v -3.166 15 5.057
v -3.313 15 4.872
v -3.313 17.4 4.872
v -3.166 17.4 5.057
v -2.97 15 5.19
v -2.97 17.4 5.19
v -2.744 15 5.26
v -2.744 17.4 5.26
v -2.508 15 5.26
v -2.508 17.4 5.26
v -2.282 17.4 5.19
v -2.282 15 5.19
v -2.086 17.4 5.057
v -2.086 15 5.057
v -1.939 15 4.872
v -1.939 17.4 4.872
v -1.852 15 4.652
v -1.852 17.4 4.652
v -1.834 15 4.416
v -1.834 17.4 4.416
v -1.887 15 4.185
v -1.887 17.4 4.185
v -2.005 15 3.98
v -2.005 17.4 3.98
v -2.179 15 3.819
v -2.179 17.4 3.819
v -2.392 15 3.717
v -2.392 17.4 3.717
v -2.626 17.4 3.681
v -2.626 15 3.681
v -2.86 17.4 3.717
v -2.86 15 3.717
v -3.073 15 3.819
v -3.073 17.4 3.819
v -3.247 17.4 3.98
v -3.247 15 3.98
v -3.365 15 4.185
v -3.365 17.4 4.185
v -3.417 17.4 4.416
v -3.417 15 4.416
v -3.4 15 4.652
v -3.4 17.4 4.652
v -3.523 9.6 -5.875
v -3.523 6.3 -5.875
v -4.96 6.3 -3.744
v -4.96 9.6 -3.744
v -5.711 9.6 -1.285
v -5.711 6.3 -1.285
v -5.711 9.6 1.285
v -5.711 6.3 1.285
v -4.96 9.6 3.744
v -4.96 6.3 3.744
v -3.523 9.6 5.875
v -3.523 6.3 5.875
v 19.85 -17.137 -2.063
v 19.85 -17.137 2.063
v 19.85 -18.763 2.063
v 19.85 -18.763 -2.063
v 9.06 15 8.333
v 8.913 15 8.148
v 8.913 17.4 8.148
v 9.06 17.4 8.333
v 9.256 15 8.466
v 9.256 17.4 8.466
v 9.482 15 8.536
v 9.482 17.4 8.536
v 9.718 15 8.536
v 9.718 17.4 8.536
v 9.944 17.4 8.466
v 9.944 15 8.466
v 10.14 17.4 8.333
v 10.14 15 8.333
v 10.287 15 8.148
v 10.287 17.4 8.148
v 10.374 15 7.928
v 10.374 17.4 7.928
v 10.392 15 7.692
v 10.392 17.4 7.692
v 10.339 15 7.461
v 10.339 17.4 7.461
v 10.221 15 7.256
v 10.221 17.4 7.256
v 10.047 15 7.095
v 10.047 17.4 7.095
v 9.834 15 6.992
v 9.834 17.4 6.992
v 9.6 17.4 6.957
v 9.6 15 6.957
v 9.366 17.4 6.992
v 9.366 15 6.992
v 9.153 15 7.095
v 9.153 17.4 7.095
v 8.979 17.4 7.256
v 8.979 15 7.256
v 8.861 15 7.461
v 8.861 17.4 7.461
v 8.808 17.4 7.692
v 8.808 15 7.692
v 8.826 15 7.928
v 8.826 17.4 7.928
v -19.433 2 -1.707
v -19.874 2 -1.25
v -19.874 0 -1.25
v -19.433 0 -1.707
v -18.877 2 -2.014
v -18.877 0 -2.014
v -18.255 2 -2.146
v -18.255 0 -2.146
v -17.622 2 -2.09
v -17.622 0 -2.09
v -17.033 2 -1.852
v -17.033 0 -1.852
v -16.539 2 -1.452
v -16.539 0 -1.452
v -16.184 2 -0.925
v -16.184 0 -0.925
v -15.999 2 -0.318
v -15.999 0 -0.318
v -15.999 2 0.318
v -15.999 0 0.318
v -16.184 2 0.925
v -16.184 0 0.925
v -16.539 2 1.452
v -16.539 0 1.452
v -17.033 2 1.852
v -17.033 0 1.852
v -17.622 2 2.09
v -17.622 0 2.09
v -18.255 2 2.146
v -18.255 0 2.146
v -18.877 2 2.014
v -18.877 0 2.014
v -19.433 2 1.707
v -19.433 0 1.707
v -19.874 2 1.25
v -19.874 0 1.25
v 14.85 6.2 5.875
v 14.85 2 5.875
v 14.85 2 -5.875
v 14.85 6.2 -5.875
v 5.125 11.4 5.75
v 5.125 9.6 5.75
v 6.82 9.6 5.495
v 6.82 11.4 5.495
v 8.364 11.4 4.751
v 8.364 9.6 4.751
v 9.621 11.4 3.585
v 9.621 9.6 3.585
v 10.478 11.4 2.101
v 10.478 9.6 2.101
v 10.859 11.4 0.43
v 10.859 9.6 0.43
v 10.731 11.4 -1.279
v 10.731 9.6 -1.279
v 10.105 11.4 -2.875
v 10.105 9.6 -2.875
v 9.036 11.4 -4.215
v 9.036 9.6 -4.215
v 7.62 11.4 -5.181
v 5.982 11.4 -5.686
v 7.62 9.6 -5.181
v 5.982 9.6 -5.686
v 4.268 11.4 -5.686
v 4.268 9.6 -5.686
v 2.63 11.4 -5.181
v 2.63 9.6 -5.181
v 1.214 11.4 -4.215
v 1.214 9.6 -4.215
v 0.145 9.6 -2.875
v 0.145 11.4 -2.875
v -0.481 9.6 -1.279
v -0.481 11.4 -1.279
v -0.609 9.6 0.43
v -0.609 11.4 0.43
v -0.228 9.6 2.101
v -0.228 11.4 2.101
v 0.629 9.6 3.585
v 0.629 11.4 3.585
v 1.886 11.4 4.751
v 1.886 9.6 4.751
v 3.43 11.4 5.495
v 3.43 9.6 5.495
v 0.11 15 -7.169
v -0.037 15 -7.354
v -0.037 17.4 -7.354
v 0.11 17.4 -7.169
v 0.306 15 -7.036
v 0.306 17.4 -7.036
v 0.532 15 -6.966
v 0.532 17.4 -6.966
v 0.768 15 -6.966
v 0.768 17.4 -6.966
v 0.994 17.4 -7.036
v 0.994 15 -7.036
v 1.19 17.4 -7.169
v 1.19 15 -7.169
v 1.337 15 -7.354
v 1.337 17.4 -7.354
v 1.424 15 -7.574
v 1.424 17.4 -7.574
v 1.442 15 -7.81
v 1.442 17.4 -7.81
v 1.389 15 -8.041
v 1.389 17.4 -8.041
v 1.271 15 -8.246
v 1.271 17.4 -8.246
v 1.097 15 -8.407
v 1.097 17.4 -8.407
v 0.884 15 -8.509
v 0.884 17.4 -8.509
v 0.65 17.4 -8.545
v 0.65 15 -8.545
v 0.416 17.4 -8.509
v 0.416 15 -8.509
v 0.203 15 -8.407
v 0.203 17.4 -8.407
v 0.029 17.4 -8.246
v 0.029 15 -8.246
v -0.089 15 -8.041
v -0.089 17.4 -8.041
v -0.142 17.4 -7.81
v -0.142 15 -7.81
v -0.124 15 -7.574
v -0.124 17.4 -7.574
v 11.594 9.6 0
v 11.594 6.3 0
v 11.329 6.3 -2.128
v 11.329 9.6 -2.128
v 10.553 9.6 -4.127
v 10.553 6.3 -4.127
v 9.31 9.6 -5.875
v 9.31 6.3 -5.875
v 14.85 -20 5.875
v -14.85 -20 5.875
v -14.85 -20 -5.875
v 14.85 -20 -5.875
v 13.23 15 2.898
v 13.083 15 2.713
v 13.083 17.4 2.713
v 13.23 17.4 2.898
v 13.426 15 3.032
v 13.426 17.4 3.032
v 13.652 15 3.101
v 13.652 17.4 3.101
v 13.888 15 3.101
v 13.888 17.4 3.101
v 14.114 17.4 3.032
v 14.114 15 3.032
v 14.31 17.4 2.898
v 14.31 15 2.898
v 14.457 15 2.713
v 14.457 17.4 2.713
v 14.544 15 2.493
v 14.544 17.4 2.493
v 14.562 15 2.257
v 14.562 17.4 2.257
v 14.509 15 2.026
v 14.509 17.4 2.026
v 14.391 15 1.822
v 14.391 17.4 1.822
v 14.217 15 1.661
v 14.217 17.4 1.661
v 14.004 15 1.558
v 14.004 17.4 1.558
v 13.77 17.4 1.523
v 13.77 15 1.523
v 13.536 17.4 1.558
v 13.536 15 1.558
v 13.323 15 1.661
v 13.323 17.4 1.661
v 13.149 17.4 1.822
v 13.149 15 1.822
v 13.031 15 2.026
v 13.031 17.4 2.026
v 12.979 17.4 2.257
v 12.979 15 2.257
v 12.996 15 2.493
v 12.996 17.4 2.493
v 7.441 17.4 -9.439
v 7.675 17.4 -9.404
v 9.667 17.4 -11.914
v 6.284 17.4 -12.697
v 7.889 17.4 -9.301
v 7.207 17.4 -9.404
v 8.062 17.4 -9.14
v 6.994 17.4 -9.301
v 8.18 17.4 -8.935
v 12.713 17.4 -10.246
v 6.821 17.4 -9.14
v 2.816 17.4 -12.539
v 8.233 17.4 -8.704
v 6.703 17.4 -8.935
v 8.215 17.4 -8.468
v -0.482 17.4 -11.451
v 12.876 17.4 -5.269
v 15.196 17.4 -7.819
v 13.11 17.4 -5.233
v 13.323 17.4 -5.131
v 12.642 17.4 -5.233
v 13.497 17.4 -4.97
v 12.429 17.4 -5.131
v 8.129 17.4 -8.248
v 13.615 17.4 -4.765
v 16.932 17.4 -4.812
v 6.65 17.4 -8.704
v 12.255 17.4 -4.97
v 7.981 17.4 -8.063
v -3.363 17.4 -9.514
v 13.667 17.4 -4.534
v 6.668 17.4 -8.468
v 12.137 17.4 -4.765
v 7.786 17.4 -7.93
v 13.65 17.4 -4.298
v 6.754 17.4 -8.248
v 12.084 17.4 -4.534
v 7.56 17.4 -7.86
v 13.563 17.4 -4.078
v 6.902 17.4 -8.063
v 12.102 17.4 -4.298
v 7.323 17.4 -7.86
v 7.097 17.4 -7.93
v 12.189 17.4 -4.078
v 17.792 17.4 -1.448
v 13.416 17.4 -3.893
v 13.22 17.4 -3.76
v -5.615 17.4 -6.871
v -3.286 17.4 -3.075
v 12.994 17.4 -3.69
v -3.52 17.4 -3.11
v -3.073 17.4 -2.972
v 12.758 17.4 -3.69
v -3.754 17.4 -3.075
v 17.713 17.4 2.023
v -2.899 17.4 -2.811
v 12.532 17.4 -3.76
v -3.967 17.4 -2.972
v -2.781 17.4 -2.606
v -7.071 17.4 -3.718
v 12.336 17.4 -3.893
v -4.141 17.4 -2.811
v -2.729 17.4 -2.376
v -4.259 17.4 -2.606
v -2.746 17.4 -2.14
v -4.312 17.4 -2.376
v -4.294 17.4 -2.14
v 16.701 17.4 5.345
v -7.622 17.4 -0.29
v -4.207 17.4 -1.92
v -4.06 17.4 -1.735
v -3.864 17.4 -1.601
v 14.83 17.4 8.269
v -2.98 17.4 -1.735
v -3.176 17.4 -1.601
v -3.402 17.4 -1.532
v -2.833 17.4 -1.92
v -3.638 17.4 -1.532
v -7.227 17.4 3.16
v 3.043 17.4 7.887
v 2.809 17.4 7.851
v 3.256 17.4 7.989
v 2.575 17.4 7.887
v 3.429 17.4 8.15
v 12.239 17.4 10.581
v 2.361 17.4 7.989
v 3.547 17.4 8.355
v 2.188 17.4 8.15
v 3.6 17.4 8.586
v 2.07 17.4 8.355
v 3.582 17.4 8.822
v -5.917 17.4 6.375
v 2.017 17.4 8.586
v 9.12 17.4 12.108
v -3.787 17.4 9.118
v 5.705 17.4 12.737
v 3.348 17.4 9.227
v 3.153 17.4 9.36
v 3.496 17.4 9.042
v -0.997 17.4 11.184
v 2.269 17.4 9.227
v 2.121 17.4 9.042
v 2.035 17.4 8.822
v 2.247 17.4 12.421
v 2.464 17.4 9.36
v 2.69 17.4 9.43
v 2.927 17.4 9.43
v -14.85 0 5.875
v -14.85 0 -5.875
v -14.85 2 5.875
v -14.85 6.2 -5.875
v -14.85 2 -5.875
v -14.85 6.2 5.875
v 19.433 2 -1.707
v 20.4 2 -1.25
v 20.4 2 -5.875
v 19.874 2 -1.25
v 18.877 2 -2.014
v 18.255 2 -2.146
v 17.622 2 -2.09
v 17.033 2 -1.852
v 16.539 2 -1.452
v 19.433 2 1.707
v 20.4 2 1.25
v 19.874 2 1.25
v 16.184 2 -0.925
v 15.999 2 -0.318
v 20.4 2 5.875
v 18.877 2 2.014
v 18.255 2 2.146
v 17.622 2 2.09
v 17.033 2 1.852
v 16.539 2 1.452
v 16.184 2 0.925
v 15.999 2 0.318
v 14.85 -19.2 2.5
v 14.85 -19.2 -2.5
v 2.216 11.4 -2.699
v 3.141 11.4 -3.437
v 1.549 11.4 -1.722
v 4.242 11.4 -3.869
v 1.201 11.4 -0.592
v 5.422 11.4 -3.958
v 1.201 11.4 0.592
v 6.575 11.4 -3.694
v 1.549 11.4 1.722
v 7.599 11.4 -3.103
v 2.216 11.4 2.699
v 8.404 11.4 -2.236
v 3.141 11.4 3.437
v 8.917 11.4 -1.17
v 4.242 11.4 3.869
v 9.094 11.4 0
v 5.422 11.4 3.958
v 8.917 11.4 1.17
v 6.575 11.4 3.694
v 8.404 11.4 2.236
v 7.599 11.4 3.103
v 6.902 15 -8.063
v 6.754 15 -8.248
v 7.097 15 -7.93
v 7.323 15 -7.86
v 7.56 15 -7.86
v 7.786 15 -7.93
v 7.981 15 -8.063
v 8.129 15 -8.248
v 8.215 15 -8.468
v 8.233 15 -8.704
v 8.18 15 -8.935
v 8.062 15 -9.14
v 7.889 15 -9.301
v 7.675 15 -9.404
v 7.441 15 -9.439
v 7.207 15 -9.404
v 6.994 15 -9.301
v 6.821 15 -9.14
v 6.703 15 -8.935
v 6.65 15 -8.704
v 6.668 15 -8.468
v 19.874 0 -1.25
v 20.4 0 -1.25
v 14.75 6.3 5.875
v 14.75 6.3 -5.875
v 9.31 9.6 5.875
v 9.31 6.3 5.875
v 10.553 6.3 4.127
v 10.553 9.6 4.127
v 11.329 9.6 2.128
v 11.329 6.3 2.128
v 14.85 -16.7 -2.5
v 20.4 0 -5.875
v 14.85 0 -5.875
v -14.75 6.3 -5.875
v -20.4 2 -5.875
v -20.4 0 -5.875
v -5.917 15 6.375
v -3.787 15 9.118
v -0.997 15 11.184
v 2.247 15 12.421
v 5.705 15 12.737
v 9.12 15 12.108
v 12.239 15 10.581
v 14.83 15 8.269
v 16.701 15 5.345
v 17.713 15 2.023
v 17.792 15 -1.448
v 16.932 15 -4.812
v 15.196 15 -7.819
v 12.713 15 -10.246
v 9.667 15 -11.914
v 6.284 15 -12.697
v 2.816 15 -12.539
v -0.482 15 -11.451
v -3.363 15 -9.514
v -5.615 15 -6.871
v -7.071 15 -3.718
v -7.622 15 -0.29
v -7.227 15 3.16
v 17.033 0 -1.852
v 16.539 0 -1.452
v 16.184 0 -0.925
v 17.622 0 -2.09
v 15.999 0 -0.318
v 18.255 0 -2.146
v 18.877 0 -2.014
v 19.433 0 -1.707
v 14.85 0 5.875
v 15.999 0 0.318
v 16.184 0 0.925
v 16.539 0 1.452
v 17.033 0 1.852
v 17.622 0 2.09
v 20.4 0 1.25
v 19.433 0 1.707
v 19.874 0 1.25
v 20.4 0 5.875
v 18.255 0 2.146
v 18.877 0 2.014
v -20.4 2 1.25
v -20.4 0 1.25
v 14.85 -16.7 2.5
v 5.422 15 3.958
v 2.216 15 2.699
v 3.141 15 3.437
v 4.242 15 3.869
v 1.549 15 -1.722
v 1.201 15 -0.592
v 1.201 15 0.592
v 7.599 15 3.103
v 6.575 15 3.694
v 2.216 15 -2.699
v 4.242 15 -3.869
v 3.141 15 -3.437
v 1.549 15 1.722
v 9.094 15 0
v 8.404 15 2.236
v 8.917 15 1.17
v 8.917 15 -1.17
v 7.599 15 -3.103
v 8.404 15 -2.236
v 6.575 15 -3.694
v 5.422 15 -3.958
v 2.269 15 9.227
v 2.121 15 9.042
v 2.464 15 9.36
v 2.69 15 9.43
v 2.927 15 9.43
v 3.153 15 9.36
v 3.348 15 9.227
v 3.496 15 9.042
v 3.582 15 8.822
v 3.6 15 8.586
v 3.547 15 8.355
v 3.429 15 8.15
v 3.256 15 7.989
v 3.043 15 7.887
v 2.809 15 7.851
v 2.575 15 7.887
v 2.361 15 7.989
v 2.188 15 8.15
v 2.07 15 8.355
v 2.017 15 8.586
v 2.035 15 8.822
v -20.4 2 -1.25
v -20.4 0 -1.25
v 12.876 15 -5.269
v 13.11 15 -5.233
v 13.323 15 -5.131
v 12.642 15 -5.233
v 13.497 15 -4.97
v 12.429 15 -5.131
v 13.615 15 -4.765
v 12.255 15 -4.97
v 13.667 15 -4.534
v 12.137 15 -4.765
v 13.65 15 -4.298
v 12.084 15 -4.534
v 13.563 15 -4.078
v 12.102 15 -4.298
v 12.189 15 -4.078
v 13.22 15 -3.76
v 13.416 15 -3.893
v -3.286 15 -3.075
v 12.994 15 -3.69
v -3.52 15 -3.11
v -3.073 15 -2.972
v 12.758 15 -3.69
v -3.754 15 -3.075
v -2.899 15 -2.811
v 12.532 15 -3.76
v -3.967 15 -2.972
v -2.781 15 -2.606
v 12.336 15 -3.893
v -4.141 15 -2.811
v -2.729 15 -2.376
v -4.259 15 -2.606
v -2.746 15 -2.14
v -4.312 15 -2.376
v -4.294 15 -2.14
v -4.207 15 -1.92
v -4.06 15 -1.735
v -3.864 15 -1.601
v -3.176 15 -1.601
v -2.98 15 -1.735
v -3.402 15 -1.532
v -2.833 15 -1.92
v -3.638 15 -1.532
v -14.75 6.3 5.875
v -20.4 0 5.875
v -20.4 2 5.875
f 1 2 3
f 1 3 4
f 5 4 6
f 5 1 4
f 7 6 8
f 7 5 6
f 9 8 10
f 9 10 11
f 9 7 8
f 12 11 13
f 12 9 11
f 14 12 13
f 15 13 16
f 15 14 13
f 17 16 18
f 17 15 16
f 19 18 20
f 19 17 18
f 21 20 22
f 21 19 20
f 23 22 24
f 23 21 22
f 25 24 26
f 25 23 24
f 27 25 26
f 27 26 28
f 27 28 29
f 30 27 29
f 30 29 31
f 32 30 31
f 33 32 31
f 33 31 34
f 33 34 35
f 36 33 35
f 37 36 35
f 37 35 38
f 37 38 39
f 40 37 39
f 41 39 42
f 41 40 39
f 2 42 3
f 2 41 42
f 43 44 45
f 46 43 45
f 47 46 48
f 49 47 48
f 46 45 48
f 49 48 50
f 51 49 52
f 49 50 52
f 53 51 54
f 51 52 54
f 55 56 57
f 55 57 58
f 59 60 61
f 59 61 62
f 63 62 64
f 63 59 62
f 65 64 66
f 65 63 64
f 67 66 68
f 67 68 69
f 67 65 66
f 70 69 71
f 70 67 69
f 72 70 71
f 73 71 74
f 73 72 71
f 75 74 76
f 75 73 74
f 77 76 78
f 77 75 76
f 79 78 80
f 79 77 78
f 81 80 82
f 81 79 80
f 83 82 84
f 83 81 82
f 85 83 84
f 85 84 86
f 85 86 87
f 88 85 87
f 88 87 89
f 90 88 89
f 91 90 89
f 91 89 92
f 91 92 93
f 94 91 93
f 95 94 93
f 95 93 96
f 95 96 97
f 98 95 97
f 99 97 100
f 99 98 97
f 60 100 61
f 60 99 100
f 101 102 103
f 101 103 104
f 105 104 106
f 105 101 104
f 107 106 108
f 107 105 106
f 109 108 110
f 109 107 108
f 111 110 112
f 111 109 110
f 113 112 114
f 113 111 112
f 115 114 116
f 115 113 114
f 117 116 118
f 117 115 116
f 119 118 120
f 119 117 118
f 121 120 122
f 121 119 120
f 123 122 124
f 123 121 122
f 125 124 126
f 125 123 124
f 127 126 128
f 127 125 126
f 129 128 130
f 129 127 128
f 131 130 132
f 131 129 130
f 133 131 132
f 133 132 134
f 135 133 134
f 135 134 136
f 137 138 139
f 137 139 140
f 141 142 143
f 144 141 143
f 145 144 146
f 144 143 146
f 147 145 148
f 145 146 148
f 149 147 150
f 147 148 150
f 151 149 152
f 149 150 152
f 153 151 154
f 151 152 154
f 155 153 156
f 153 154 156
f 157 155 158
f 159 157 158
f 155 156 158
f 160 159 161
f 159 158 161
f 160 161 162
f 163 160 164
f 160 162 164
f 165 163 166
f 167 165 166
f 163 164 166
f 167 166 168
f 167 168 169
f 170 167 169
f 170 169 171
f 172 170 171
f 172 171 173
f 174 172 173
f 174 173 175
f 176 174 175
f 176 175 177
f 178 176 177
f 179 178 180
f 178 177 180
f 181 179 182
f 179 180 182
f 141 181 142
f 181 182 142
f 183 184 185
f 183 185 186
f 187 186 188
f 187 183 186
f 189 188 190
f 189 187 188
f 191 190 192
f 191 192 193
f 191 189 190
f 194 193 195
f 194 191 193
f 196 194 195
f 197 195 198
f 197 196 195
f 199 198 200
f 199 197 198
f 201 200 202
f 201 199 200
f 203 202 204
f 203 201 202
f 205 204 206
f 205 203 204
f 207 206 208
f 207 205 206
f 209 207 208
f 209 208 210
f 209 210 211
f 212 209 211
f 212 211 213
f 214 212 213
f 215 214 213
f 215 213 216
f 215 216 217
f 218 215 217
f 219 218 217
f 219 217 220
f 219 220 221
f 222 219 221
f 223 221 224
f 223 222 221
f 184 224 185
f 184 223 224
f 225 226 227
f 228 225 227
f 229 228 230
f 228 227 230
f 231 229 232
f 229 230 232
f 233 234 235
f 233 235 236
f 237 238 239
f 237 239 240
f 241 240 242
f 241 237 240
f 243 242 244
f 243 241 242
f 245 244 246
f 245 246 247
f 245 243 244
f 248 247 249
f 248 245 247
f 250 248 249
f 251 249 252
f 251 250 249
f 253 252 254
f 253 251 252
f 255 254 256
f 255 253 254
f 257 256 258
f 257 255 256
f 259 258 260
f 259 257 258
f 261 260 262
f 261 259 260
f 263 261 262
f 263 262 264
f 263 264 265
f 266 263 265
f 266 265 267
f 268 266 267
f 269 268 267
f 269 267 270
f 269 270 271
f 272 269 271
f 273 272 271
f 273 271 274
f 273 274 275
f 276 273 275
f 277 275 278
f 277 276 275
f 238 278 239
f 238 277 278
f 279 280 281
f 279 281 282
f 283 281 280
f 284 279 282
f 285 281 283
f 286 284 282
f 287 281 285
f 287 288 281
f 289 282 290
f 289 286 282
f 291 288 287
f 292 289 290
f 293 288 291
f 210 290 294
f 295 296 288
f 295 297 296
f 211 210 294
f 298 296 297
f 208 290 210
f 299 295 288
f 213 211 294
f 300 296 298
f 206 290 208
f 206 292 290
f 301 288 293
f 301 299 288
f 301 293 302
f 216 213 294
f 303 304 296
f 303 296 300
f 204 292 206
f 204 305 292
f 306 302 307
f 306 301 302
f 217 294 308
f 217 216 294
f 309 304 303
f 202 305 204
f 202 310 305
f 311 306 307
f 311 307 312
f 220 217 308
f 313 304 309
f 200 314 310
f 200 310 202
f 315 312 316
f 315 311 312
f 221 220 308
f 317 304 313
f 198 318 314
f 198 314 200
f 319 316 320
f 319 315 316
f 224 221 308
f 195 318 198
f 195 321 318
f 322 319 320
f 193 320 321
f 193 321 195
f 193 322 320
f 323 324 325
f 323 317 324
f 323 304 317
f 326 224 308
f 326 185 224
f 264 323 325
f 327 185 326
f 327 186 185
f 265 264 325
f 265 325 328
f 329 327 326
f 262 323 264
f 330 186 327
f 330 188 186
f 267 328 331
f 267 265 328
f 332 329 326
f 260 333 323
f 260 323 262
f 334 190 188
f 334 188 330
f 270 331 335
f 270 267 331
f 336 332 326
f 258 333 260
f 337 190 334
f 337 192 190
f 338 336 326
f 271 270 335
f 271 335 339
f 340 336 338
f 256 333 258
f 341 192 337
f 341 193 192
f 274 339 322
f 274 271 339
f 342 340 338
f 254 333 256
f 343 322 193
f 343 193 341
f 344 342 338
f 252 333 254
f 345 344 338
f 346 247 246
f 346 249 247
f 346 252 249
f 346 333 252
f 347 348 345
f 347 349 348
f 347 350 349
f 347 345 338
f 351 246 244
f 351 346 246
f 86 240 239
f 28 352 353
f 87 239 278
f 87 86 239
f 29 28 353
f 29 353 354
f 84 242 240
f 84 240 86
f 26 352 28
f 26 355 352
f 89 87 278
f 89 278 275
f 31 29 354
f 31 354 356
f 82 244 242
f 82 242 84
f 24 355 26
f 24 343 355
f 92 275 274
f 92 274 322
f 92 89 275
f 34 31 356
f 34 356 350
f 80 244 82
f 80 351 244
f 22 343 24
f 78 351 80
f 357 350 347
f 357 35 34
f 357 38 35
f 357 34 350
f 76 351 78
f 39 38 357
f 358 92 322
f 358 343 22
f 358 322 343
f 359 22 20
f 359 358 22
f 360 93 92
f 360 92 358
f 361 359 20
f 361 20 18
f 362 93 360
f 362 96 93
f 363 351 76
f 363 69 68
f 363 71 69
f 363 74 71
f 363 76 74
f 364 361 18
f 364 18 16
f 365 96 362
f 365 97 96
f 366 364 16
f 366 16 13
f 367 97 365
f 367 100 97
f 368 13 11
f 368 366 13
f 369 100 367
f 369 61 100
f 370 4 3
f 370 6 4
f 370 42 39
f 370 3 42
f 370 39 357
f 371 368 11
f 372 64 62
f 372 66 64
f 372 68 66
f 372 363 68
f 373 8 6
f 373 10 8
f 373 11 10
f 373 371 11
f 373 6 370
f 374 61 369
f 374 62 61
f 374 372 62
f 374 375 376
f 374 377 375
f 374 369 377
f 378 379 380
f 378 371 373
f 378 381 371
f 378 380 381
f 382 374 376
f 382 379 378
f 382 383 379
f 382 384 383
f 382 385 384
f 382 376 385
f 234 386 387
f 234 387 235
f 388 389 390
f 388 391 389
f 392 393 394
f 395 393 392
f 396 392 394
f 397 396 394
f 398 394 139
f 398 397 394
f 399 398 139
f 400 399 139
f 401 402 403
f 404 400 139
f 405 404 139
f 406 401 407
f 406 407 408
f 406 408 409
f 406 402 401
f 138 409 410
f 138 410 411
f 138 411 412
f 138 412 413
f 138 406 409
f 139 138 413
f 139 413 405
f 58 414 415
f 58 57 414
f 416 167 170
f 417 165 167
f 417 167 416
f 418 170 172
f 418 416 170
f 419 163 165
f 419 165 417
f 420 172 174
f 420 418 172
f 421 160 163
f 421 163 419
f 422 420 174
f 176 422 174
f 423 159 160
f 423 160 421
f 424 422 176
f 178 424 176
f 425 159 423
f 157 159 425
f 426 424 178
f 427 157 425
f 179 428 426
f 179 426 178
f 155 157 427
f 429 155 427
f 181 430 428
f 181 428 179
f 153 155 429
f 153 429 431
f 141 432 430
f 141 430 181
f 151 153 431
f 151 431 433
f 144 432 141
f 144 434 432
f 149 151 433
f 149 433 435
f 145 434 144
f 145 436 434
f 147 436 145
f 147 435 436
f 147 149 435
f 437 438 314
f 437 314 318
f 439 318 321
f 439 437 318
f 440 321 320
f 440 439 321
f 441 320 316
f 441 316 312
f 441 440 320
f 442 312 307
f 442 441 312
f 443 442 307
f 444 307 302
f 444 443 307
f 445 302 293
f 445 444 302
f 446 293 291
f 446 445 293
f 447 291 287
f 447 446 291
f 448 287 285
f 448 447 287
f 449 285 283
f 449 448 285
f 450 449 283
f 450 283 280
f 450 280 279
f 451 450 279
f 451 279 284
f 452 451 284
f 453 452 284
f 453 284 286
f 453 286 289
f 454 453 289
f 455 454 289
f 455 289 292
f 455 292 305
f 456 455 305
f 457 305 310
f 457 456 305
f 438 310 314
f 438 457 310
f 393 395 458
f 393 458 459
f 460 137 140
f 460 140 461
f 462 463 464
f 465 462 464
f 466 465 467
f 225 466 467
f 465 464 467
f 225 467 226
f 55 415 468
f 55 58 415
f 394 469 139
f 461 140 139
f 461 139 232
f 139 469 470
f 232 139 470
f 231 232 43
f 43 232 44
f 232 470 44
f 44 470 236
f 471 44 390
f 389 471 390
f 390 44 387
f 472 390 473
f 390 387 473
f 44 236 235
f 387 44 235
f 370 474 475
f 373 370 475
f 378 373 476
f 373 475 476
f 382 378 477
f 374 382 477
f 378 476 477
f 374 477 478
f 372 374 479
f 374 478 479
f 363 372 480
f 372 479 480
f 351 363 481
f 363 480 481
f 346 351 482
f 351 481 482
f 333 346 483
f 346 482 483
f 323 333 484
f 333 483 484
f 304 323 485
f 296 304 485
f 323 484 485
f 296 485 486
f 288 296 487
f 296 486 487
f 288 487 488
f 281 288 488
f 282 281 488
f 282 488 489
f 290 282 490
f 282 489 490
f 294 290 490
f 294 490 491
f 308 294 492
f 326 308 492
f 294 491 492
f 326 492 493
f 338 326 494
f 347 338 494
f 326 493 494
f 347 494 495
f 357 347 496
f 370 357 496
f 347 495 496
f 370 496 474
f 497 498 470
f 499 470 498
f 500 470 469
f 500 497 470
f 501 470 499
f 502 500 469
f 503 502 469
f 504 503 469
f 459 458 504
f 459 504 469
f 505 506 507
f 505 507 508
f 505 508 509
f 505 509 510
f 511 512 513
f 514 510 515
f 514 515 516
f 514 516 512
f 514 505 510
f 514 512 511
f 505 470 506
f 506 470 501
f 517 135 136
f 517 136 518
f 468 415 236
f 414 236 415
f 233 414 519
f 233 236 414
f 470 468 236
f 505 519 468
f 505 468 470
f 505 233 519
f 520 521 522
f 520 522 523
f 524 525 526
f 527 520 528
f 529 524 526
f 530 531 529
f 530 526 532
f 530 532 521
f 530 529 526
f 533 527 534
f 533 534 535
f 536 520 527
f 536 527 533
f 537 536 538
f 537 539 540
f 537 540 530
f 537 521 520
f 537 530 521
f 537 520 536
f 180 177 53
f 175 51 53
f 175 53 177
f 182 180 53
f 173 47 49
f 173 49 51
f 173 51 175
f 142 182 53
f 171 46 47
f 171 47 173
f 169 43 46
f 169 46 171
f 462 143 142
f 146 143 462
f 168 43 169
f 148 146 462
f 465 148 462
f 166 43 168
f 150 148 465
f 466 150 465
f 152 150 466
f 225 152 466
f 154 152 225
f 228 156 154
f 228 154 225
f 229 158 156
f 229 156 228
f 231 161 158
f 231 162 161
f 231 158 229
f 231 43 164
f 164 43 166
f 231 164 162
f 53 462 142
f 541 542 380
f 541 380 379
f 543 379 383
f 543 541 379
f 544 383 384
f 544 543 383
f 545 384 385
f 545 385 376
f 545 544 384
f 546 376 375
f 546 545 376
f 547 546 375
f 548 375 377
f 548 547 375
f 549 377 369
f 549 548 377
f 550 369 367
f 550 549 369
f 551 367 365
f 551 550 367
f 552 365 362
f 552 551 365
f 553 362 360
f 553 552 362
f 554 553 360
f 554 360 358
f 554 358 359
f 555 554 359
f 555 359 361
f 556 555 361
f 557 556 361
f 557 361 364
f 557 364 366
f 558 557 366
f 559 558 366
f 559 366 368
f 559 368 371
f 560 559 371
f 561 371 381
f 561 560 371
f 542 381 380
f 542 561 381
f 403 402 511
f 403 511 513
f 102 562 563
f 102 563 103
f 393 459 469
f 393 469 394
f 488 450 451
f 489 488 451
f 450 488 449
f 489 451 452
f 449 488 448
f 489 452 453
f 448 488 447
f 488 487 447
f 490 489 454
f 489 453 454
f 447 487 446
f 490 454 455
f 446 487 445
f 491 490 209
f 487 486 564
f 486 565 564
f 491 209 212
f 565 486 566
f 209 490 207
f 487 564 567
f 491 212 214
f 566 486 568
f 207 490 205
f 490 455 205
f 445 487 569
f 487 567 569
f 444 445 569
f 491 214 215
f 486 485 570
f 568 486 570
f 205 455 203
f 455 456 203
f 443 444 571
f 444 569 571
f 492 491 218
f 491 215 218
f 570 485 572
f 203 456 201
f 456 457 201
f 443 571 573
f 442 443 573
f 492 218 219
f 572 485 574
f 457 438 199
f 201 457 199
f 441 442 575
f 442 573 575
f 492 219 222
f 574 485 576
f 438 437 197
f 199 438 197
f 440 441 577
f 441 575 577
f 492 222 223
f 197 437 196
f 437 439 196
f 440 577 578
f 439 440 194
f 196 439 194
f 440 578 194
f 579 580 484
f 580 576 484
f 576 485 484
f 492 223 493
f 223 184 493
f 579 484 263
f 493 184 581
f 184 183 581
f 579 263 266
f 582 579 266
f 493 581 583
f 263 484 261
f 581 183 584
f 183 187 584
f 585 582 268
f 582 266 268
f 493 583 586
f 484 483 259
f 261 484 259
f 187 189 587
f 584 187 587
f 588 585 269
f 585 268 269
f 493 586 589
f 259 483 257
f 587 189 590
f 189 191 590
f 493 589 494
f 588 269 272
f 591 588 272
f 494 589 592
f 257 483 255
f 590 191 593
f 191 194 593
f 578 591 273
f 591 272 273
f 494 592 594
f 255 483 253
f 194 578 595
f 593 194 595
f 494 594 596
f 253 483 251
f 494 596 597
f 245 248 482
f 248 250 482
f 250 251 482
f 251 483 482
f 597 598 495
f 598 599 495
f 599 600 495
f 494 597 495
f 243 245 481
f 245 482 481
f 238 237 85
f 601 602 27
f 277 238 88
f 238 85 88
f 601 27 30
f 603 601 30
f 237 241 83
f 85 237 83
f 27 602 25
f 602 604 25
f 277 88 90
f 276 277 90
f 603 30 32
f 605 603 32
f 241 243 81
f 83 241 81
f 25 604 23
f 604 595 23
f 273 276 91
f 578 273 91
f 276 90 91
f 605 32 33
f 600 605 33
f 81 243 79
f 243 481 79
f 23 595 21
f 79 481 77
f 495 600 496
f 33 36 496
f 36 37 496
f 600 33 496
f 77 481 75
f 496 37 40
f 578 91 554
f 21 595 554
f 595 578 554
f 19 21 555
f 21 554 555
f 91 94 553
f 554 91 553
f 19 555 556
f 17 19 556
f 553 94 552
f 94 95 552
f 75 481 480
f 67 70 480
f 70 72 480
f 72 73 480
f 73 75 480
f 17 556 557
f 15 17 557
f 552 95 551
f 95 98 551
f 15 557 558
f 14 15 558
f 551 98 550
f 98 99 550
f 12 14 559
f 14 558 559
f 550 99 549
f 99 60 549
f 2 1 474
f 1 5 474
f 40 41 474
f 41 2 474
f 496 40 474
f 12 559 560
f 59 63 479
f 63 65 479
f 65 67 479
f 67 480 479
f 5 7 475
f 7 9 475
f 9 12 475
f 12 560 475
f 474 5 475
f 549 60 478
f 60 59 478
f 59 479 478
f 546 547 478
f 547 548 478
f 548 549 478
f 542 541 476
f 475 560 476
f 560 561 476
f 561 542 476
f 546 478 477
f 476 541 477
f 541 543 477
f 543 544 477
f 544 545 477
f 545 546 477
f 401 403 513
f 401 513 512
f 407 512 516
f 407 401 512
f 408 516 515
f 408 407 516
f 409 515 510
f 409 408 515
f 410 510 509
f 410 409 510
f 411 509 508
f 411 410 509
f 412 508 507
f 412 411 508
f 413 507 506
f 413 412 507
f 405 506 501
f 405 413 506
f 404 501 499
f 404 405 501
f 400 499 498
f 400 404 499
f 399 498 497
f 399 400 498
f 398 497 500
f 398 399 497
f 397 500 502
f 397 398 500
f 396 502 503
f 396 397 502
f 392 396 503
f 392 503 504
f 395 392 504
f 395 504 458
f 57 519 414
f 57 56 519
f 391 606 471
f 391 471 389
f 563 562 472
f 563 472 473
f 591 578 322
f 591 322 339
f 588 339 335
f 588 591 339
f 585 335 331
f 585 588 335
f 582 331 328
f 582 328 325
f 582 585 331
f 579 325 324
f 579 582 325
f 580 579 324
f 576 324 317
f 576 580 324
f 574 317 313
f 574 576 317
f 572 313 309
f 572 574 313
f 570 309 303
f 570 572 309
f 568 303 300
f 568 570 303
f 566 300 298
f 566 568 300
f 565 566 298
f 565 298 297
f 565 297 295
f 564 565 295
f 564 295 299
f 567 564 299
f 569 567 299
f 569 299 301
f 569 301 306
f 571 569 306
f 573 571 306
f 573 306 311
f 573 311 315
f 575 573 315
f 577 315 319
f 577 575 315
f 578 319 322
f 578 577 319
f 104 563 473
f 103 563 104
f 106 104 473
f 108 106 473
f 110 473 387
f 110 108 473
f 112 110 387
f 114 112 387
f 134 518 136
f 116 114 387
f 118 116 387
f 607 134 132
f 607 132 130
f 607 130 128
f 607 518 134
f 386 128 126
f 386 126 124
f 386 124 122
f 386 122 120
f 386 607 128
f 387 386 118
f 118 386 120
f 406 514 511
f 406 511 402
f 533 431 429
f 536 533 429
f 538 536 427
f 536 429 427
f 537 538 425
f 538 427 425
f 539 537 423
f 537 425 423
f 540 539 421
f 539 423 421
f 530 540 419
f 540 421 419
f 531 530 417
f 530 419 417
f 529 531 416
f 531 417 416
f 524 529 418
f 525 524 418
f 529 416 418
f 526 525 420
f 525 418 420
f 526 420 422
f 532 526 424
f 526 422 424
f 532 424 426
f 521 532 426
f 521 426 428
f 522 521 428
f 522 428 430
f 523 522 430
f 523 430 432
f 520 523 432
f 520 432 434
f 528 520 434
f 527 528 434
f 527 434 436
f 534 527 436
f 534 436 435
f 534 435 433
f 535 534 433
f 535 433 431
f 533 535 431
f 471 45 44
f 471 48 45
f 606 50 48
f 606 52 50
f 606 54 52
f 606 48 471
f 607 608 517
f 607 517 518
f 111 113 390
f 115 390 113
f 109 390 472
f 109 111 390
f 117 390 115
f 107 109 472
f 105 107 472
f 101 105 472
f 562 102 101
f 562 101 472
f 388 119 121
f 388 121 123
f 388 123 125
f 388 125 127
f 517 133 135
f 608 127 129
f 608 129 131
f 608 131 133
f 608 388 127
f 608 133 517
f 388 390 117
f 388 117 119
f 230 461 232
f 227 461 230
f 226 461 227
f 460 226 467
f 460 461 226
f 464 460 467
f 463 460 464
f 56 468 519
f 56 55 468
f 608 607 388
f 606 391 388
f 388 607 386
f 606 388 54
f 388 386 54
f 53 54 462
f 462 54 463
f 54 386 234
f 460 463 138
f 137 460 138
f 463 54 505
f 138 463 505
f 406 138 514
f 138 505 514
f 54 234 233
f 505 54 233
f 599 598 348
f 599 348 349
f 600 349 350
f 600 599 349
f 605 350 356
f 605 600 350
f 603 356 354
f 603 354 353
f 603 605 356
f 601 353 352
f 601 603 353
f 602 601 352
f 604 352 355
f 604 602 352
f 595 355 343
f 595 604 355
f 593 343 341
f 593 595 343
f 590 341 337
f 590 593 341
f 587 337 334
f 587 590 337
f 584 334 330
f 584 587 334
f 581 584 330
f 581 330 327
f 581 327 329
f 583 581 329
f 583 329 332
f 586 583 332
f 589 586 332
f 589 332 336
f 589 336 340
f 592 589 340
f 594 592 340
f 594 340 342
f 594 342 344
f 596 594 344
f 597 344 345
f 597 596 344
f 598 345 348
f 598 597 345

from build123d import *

# Parameters (mm, degrees)
BOSS_EXTRUDE1_DEPTH   = 5.875
CUT_EXTRUDE1_REACH    = 32.572
SKETCH3_R             = 3.96875
BOSS_EXTRUDE2_DEPTH   = 13
SKETCH5_W             = 5
SKETCH5_H             = 2.5
BOSS_EXTRUDE4_DEPTH   = 5
BOSS_EXTRUDE4_TAPER   = 5
SKETCH6_R             = 3.96875
BOSS_EXTRUDE5_DEPTH   = 3.3
SKETCH7_R             = 5.75
BOSS_EXTRUDE6_DEPTH   = 1.8
SKETCH4_R             = 12.75
SKETCH4_R_2           = 0.79375
BOSS_EXTRUDE3_DEPTH   = 2.4
BODY_MOVE_COPY1_ANGLE = 30


with BuildPart() as part:
    # Sketch1 → Boss-Extrude1 (new, symmetric)
    with BuildSketch(Plane.XY):
        Polygon((-20.4, 2), (-20.4, 0), (-14.85, 0), (-14.85, -20), (14.85, -20), (14.85, 0), (20.4, 0), (20.4, 2), (14.85, 2), (14.85, 6.2), (14.75, 6.3), (-14.75, 6.3), (-14.85, 6.2), (-14.85, 2), align=None)
    extrude(amount=BOSS_EXTRUDE1_DEPTH, both=True)

    # Sketch2 → Cut-Extrude1 (cut, up to next)
    with BuildSketch(Plane(origin=(0, 2, 0), x_dir=(1, 0, 0), z_dir=(0, 1, 0)), mode=Mode.PRIVATE) as cut_extrude1_sk1:
        with BuildLine():
            Line((-20.4, 1.25), (-19.874285568, 1.25))
            ThreePointArc((-19.874285568, 1.25), (-15.975, 0), (-19.874285568, -1.25))
            Line((-19.874285568, -1.25), (-20.4, -1.25))
            Line((-20.4, -1.25), (-20.4, 1.25))
        make_face()
    cut_extrude1_tool1 = extrude(cut_extrude1_sk1.sketch, amount=-CUT_EXTRUDE1_REACH, mode=Mode.PRIVATE) & part.part
    # Sketch2 → Cut-Extrude1 (cut, up to next)
    with BuildSketch(Plane(origin=(0, 2, 0), x_dir=(1, 0, 0), z_dir=(0, 1, 0)), mode=Mode.PRIVATE) as cut_extrude1_sk2:
        with BuildLine():
            Line((20.4, 1.25), (20.4, -1.25))
            Line((20.4, -1.25), (19.874285568, -1.25))
            ThreePointArc((19.874285568, -1.25), (15.975, 0), (19.874285568, 1.25))
            Line((19.874285568, 1.25), (20.4, 1.25))
        make_face()
    cut_extrude1_tool2 = extrude(cut_extrude1_sk2.sketch, amount=-CUT_EXTRUDE1_REACH, mode=Mode.PRIVATE) & part.part
    add(cut_extrude1_tool1.solids().sort_by_distance((-18.213582, 2, 0))[0], mode=Mode.SUBTRACT)
    add(cut_extrude1_tool2.solids().sort_by_distance((18.213582, 2, 0))[0], mode=Mode.SUBTRACT)

    # Sketch3 → Boss-Extrude2 (add)
    with BuildSketch(Plane(origin=(0, 2, 0), x_dir=(1, 0, 0), z_dir=(0, 1, 0))):
        with Locations((5.125, 0)):
            Circle(SKETCH3_R)
    extrude(amount=BOSS_EXTRUDE2_DEPTH)

    # Sketch5 → Boss-Extrude4 (add)
    with BuildSketch(Plane(origin=(14.85, 0, 0), x_dir=(0, 0, -1), z_dir=(1, 0, 0))):
        with Locations((0, -17.95)):
            Rectangle(SKETCH5_W, SKETCH5_H)
    extrude(amount=BOSS_EXTRUDE4_DEPTH, taper=BOSS_EXTRUDE4_TAPER)

    # Sketch6 → Boss-Extrude5 (add)
    with BuildSketch(Plane(origin=(0, 6.3, 0), x_dir=(1, 0, 0), z_dir=(0, 1, 0))):
        with BuildLine():
            ThreePointArc((9.31047619, -5.875), (11.002865792, -3.151545823), (11.59375, 0))
            ThreePointArc((11.59375, 0), (11.002865792, 3.151545823), (9.31047619, 5.875))
            Line((9.31047619, 5.875), (-3.52297619, 5.875))
            ThreePointArc((-3.52297619, 5.875), (-5.80625, 0), (-3.52297619, -5.875))
            Line((-3.52297619, -5.875), (9.31047619, -5.875))
        make_face()
        with Locations((5.125, 0)):
            Circle(SKETCH6_R, mode=Mode.SUBTRACT)
    extrude(amount=BOSS_EXTRUDE5_DEPTH)

    # Sketch7 → Boss-Extrude6 (add)
    with BuildSketch(Plane(origin=(0, 9.6, 0), x_dir=(1, 0, 0), z_dir=(0, 1, 0))):
        with Locations(Location((5.125, 0, 0), (0, 0, 270))):
            Circle(SKETCH7_R)
    extrude(amount=BOSS_EXTRUDE6_DEPTH)


with BuildPart() as body_2:
    # Sketch4 → Boss-Extrude3 (new body)
    with BuildSketch(Plane(origin=(0, 15, 0), x_dir=(1, 0, 0), z_dir=(0, 1, 0))):
        with Locations(Location((5.125, 0, 0), (0, 0, 180))):
            Circle(SKETCH4_R)
        with Locations(Location((14.075, 0, 0), (0, 0, 180))):
            Circle(SKETCH4_R_2, mode=Mode.SUBTRACT)
        with Locations(Location((11.453605692, 6.328605692, 0), (0, 0, 180))):
            Circle(SKETCH4_R_2, mode=Mode.SUBTRACT)
        with Locations(Location((5.125, 8.95, 0), (0, 0, 180))):
            Circle(SKETCH4_R_2, mode=Mode.SUBTRACT)
        with Locations(Location((-3.825, 0, 0), (0, 0, 180))):
            Circle(SKETCH4_R_2, mode=Mode.SUBTRACT)
        with Locations(Location((-1.203605692, -6.328605692, 0), (0, 0, 180))):
            Circle(SKETCH4_R_2, mode=Mode.SUBTRACT)
        with Locations(Location((5.125, -8.95, 0), (0, 0, 180))):
            Circle(SKETCH4_R_2, mode=Mode.SUBTRACT)
        with Locations(Location((11.453605692, -6.328605692, 0), (0, 0, 180))):
            Circle(SKETCH4_R_2, mode=Mode.SUBTRACT)
        with Locations(Location((-1.203605692, 6.328605692, 0), (0, 0, 180))):
            Circle(SKETCH4_R_2, mode=Mode.SUBTRACT)
    extrude(amount=BOSS_EXTRUDE3_DEPTH)


with BuildPart() as body_2_1:
    # Body-Move/Copy1: moved
    add(body_2.part.rotate(Axis((5.125, 0, 0), (0, 1, 0)), BODY_MOVE_COPY1_ANGLE))


solid = Compound([part.part, body_2_1.part])
